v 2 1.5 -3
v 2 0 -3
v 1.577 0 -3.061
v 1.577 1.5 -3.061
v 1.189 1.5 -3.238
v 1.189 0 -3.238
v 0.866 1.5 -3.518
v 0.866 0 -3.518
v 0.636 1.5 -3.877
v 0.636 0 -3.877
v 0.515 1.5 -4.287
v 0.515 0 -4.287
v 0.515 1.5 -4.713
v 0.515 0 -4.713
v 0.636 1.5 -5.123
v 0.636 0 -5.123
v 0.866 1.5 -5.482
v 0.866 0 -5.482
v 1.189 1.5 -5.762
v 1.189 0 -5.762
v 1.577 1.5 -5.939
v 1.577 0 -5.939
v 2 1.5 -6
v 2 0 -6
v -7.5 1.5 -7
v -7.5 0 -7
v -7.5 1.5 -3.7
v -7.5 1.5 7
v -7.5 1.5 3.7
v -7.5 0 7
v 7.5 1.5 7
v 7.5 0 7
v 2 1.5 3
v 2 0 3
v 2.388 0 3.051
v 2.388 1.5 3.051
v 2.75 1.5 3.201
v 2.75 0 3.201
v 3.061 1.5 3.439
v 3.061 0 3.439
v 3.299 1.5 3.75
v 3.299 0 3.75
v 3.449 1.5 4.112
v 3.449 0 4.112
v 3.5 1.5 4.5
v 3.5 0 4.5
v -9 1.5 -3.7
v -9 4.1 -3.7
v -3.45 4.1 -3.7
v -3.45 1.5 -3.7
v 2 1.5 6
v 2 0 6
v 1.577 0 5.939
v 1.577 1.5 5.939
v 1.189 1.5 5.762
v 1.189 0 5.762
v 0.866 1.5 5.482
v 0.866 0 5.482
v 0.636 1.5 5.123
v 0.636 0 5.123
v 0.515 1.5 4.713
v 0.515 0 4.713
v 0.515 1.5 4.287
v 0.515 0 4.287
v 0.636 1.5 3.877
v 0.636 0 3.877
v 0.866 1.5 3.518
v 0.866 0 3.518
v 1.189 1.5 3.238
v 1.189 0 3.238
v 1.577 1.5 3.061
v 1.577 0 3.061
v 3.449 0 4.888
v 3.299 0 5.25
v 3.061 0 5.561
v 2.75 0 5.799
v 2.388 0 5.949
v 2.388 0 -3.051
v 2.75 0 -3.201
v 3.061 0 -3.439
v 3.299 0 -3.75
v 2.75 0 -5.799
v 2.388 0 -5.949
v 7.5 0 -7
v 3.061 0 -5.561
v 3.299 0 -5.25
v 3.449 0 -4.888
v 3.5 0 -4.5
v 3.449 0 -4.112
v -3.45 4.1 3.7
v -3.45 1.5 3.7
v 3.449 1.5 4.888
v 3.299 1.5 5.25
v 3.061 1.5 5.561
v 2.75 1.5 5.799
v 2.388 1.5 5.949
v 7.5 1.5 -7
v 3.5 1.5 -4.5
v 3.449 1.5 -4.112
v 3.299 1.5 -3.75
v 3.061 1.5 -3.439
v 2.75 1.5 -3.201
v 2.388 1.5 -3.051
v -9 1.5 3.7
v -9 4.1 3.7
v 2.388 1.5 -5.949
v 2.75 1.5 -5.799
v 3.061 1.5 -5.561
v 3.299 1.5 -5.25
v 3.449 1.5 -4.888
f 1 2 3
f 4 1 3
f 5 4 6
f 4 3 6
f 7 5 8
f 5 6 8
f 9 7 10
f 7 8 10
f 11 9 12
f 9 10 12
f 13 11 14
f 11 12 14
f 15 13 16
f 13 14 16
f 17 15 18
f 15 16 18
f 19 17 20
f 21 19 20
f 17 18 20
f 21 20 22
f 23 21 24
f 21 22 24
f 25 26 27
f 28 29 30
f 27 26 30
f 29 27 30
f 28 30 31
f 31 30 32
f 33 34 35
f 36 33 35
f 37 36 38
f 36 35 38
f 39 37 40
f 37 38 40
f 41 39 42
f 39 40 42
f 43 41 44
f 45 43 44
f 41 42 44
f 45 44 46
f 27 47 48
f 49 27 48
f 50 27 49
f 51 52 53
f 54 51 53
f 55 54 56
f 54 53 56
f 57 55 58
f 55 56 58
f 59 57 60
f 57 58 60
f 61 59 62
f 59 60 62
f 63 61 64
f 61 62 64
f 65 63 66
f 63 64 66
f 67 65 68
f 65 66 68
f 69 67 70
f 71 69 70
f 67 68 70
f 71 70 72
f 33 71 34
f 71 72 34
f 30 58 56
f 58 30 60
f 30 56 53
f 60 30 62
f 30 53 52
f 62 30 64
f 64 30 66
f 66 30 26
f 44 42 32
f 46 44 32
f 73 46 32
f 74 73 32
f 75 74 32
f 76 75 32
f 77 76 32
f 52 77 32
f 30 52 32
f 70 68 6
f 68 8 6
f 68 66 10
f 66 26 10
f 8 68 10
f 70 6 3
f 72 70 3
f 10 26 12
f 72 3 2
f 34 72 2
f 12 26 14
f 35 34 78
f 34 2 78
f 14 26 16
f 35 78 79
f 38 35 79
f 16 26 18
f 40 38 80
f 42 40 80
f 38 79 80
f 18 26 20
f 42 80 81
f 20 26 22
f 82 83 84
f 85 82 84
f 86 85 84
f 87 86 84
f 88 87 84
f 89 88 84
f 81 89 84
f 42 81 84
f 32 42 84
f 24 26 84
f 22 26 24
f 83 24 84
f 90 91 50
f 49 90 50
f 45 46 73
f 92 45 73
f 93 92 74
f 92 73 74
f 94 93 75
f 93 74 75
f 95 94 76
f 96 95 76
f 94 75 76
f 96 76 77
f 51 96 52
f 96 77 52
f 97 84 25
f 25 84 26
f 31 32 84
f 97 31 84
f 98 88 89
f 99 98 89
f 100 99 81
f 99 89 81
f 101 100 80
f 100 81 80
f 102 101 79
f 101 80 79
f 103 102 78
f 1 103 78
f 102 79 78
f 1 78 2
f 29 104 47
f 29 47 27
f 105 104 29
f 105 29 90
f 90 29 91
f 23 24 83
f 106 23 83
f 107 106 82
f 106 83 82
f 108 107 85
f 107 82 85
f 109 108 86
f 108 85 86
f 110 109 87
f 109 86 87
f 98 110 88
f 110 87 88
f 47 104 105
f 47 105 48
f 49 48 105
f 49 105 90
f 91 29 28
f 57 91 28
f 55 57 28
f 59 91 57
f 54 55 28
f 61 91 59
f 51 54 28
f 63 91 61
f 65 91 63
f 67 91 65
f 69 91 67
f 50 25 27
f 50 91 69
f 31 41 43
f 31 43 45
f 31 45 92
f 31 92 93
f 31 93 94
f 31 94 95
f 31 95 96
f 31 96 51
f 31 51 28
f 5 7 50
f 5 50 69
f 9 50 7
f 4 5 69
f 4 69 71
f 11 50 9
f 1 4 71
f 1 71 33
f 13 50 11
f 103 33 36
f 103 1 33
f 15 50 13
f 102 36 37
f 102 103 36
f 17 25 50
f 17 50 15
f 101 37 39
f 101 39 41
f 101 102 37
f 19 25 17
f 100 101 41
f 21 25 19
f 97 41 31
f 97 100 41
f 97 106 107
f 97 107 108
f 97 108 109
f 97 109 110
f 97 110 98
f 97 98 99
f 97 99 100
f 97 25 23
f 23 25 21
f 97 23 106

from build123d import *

# Parameters (mm, degrees)
SKETCH_1_W      = 3
SKETCH_1_H      = 14
SKETCH_1_W_2    = 4.05
SKETCH_1_H_2    = 7.4
EXTRUDE_1_DEPTH = 1.5
EXTRUDE_START   = 1.5
SKETCH_1_3_W    = 5.55
SKETCH_1_3_H    = 7.4
EXTRUDE_2_DEPTH = 2.6


with BuildPart() as part:
    # Эскиз1 → Бобышка-Вытянуть1 (new body)
    with BuildSketch(Plane(origin=(0, 0, 0), x_dir=(1, 0, 0), z_dir=(0, 1, 0))):
        with BuildLine():
            Line((4.5, 7), (2, 7))
            Line((2, 7), (2, 6))
            ThreePointArc((2, 6), (3.060660172, 5.560660172), (3.5, 4.5))
            ThreePointArc((3.5, 4.5), (3.060660172, 3.439339828), (2, 3))
            Line((2, 3), (2, -3))
            ThreePointArc((2, -3), (3.060660172, -3.439339828), (3.5, -4.5))
            ThreePointArc((3.5, -4.5), (3.060660172, -5.560660172), (2, -6))
            Line((2, -6), (2, -7))
            Line((2, -7), (4.5, -7))
            Line((4.5, -7), (4.5, 7))
        make_face()
        with Locations((6, 0)):
            Rectangle(SKETCH_1_W, SKETCH_1_H)
        with BuildLine():
            Line((-7.5, 7), (-7.5, 3.7))
            Line((-7.5, 3.7), (-3.45, 3.7))
            Line((-3.45, 3.7), (-3.45, -3.7))
            Line((-3.45, -3.7), (-7.5, -3.7))
            Line((-7.5, -3.7), (-7.5, -7))
            Line((-7.5, -7), (2, -7))
            Line((2, -7), (2, -6))
            ThreePointArc((2, -6), (0.5, -4.5), (2, -3))
            Line((2, -3), (2, 3))
            ThreePointArc((2, 3), (0.5, 4.5), (2, 6))
            Line((2, 6), (2, 7))
            Line((2, 7), (-7.5, 7))
        make_face()
        with Locations((-5.475, 0)):
            Rectangle(SKETCH_1_W_2, SKETCH_1_H_2)
    extrude(amount=EXTRUDE_1_DEPTH)

    # Эскиз1<3> → Бобышка-Вытянуть2 (add)
    with BuildSketch(Plane(origin=(0, 0, 0), x_dir=(1, 0, 0), z_dir=(0, 1, 0)).offset(EXTRUDE_START)):
        with Locations((-6.225, 0)):
            Rectangle(SKETCH_1_3_W, SKETCH_1_3_H)
    extrude(amount=EXTRUDE_2_DEPTH)


solid = part.part
